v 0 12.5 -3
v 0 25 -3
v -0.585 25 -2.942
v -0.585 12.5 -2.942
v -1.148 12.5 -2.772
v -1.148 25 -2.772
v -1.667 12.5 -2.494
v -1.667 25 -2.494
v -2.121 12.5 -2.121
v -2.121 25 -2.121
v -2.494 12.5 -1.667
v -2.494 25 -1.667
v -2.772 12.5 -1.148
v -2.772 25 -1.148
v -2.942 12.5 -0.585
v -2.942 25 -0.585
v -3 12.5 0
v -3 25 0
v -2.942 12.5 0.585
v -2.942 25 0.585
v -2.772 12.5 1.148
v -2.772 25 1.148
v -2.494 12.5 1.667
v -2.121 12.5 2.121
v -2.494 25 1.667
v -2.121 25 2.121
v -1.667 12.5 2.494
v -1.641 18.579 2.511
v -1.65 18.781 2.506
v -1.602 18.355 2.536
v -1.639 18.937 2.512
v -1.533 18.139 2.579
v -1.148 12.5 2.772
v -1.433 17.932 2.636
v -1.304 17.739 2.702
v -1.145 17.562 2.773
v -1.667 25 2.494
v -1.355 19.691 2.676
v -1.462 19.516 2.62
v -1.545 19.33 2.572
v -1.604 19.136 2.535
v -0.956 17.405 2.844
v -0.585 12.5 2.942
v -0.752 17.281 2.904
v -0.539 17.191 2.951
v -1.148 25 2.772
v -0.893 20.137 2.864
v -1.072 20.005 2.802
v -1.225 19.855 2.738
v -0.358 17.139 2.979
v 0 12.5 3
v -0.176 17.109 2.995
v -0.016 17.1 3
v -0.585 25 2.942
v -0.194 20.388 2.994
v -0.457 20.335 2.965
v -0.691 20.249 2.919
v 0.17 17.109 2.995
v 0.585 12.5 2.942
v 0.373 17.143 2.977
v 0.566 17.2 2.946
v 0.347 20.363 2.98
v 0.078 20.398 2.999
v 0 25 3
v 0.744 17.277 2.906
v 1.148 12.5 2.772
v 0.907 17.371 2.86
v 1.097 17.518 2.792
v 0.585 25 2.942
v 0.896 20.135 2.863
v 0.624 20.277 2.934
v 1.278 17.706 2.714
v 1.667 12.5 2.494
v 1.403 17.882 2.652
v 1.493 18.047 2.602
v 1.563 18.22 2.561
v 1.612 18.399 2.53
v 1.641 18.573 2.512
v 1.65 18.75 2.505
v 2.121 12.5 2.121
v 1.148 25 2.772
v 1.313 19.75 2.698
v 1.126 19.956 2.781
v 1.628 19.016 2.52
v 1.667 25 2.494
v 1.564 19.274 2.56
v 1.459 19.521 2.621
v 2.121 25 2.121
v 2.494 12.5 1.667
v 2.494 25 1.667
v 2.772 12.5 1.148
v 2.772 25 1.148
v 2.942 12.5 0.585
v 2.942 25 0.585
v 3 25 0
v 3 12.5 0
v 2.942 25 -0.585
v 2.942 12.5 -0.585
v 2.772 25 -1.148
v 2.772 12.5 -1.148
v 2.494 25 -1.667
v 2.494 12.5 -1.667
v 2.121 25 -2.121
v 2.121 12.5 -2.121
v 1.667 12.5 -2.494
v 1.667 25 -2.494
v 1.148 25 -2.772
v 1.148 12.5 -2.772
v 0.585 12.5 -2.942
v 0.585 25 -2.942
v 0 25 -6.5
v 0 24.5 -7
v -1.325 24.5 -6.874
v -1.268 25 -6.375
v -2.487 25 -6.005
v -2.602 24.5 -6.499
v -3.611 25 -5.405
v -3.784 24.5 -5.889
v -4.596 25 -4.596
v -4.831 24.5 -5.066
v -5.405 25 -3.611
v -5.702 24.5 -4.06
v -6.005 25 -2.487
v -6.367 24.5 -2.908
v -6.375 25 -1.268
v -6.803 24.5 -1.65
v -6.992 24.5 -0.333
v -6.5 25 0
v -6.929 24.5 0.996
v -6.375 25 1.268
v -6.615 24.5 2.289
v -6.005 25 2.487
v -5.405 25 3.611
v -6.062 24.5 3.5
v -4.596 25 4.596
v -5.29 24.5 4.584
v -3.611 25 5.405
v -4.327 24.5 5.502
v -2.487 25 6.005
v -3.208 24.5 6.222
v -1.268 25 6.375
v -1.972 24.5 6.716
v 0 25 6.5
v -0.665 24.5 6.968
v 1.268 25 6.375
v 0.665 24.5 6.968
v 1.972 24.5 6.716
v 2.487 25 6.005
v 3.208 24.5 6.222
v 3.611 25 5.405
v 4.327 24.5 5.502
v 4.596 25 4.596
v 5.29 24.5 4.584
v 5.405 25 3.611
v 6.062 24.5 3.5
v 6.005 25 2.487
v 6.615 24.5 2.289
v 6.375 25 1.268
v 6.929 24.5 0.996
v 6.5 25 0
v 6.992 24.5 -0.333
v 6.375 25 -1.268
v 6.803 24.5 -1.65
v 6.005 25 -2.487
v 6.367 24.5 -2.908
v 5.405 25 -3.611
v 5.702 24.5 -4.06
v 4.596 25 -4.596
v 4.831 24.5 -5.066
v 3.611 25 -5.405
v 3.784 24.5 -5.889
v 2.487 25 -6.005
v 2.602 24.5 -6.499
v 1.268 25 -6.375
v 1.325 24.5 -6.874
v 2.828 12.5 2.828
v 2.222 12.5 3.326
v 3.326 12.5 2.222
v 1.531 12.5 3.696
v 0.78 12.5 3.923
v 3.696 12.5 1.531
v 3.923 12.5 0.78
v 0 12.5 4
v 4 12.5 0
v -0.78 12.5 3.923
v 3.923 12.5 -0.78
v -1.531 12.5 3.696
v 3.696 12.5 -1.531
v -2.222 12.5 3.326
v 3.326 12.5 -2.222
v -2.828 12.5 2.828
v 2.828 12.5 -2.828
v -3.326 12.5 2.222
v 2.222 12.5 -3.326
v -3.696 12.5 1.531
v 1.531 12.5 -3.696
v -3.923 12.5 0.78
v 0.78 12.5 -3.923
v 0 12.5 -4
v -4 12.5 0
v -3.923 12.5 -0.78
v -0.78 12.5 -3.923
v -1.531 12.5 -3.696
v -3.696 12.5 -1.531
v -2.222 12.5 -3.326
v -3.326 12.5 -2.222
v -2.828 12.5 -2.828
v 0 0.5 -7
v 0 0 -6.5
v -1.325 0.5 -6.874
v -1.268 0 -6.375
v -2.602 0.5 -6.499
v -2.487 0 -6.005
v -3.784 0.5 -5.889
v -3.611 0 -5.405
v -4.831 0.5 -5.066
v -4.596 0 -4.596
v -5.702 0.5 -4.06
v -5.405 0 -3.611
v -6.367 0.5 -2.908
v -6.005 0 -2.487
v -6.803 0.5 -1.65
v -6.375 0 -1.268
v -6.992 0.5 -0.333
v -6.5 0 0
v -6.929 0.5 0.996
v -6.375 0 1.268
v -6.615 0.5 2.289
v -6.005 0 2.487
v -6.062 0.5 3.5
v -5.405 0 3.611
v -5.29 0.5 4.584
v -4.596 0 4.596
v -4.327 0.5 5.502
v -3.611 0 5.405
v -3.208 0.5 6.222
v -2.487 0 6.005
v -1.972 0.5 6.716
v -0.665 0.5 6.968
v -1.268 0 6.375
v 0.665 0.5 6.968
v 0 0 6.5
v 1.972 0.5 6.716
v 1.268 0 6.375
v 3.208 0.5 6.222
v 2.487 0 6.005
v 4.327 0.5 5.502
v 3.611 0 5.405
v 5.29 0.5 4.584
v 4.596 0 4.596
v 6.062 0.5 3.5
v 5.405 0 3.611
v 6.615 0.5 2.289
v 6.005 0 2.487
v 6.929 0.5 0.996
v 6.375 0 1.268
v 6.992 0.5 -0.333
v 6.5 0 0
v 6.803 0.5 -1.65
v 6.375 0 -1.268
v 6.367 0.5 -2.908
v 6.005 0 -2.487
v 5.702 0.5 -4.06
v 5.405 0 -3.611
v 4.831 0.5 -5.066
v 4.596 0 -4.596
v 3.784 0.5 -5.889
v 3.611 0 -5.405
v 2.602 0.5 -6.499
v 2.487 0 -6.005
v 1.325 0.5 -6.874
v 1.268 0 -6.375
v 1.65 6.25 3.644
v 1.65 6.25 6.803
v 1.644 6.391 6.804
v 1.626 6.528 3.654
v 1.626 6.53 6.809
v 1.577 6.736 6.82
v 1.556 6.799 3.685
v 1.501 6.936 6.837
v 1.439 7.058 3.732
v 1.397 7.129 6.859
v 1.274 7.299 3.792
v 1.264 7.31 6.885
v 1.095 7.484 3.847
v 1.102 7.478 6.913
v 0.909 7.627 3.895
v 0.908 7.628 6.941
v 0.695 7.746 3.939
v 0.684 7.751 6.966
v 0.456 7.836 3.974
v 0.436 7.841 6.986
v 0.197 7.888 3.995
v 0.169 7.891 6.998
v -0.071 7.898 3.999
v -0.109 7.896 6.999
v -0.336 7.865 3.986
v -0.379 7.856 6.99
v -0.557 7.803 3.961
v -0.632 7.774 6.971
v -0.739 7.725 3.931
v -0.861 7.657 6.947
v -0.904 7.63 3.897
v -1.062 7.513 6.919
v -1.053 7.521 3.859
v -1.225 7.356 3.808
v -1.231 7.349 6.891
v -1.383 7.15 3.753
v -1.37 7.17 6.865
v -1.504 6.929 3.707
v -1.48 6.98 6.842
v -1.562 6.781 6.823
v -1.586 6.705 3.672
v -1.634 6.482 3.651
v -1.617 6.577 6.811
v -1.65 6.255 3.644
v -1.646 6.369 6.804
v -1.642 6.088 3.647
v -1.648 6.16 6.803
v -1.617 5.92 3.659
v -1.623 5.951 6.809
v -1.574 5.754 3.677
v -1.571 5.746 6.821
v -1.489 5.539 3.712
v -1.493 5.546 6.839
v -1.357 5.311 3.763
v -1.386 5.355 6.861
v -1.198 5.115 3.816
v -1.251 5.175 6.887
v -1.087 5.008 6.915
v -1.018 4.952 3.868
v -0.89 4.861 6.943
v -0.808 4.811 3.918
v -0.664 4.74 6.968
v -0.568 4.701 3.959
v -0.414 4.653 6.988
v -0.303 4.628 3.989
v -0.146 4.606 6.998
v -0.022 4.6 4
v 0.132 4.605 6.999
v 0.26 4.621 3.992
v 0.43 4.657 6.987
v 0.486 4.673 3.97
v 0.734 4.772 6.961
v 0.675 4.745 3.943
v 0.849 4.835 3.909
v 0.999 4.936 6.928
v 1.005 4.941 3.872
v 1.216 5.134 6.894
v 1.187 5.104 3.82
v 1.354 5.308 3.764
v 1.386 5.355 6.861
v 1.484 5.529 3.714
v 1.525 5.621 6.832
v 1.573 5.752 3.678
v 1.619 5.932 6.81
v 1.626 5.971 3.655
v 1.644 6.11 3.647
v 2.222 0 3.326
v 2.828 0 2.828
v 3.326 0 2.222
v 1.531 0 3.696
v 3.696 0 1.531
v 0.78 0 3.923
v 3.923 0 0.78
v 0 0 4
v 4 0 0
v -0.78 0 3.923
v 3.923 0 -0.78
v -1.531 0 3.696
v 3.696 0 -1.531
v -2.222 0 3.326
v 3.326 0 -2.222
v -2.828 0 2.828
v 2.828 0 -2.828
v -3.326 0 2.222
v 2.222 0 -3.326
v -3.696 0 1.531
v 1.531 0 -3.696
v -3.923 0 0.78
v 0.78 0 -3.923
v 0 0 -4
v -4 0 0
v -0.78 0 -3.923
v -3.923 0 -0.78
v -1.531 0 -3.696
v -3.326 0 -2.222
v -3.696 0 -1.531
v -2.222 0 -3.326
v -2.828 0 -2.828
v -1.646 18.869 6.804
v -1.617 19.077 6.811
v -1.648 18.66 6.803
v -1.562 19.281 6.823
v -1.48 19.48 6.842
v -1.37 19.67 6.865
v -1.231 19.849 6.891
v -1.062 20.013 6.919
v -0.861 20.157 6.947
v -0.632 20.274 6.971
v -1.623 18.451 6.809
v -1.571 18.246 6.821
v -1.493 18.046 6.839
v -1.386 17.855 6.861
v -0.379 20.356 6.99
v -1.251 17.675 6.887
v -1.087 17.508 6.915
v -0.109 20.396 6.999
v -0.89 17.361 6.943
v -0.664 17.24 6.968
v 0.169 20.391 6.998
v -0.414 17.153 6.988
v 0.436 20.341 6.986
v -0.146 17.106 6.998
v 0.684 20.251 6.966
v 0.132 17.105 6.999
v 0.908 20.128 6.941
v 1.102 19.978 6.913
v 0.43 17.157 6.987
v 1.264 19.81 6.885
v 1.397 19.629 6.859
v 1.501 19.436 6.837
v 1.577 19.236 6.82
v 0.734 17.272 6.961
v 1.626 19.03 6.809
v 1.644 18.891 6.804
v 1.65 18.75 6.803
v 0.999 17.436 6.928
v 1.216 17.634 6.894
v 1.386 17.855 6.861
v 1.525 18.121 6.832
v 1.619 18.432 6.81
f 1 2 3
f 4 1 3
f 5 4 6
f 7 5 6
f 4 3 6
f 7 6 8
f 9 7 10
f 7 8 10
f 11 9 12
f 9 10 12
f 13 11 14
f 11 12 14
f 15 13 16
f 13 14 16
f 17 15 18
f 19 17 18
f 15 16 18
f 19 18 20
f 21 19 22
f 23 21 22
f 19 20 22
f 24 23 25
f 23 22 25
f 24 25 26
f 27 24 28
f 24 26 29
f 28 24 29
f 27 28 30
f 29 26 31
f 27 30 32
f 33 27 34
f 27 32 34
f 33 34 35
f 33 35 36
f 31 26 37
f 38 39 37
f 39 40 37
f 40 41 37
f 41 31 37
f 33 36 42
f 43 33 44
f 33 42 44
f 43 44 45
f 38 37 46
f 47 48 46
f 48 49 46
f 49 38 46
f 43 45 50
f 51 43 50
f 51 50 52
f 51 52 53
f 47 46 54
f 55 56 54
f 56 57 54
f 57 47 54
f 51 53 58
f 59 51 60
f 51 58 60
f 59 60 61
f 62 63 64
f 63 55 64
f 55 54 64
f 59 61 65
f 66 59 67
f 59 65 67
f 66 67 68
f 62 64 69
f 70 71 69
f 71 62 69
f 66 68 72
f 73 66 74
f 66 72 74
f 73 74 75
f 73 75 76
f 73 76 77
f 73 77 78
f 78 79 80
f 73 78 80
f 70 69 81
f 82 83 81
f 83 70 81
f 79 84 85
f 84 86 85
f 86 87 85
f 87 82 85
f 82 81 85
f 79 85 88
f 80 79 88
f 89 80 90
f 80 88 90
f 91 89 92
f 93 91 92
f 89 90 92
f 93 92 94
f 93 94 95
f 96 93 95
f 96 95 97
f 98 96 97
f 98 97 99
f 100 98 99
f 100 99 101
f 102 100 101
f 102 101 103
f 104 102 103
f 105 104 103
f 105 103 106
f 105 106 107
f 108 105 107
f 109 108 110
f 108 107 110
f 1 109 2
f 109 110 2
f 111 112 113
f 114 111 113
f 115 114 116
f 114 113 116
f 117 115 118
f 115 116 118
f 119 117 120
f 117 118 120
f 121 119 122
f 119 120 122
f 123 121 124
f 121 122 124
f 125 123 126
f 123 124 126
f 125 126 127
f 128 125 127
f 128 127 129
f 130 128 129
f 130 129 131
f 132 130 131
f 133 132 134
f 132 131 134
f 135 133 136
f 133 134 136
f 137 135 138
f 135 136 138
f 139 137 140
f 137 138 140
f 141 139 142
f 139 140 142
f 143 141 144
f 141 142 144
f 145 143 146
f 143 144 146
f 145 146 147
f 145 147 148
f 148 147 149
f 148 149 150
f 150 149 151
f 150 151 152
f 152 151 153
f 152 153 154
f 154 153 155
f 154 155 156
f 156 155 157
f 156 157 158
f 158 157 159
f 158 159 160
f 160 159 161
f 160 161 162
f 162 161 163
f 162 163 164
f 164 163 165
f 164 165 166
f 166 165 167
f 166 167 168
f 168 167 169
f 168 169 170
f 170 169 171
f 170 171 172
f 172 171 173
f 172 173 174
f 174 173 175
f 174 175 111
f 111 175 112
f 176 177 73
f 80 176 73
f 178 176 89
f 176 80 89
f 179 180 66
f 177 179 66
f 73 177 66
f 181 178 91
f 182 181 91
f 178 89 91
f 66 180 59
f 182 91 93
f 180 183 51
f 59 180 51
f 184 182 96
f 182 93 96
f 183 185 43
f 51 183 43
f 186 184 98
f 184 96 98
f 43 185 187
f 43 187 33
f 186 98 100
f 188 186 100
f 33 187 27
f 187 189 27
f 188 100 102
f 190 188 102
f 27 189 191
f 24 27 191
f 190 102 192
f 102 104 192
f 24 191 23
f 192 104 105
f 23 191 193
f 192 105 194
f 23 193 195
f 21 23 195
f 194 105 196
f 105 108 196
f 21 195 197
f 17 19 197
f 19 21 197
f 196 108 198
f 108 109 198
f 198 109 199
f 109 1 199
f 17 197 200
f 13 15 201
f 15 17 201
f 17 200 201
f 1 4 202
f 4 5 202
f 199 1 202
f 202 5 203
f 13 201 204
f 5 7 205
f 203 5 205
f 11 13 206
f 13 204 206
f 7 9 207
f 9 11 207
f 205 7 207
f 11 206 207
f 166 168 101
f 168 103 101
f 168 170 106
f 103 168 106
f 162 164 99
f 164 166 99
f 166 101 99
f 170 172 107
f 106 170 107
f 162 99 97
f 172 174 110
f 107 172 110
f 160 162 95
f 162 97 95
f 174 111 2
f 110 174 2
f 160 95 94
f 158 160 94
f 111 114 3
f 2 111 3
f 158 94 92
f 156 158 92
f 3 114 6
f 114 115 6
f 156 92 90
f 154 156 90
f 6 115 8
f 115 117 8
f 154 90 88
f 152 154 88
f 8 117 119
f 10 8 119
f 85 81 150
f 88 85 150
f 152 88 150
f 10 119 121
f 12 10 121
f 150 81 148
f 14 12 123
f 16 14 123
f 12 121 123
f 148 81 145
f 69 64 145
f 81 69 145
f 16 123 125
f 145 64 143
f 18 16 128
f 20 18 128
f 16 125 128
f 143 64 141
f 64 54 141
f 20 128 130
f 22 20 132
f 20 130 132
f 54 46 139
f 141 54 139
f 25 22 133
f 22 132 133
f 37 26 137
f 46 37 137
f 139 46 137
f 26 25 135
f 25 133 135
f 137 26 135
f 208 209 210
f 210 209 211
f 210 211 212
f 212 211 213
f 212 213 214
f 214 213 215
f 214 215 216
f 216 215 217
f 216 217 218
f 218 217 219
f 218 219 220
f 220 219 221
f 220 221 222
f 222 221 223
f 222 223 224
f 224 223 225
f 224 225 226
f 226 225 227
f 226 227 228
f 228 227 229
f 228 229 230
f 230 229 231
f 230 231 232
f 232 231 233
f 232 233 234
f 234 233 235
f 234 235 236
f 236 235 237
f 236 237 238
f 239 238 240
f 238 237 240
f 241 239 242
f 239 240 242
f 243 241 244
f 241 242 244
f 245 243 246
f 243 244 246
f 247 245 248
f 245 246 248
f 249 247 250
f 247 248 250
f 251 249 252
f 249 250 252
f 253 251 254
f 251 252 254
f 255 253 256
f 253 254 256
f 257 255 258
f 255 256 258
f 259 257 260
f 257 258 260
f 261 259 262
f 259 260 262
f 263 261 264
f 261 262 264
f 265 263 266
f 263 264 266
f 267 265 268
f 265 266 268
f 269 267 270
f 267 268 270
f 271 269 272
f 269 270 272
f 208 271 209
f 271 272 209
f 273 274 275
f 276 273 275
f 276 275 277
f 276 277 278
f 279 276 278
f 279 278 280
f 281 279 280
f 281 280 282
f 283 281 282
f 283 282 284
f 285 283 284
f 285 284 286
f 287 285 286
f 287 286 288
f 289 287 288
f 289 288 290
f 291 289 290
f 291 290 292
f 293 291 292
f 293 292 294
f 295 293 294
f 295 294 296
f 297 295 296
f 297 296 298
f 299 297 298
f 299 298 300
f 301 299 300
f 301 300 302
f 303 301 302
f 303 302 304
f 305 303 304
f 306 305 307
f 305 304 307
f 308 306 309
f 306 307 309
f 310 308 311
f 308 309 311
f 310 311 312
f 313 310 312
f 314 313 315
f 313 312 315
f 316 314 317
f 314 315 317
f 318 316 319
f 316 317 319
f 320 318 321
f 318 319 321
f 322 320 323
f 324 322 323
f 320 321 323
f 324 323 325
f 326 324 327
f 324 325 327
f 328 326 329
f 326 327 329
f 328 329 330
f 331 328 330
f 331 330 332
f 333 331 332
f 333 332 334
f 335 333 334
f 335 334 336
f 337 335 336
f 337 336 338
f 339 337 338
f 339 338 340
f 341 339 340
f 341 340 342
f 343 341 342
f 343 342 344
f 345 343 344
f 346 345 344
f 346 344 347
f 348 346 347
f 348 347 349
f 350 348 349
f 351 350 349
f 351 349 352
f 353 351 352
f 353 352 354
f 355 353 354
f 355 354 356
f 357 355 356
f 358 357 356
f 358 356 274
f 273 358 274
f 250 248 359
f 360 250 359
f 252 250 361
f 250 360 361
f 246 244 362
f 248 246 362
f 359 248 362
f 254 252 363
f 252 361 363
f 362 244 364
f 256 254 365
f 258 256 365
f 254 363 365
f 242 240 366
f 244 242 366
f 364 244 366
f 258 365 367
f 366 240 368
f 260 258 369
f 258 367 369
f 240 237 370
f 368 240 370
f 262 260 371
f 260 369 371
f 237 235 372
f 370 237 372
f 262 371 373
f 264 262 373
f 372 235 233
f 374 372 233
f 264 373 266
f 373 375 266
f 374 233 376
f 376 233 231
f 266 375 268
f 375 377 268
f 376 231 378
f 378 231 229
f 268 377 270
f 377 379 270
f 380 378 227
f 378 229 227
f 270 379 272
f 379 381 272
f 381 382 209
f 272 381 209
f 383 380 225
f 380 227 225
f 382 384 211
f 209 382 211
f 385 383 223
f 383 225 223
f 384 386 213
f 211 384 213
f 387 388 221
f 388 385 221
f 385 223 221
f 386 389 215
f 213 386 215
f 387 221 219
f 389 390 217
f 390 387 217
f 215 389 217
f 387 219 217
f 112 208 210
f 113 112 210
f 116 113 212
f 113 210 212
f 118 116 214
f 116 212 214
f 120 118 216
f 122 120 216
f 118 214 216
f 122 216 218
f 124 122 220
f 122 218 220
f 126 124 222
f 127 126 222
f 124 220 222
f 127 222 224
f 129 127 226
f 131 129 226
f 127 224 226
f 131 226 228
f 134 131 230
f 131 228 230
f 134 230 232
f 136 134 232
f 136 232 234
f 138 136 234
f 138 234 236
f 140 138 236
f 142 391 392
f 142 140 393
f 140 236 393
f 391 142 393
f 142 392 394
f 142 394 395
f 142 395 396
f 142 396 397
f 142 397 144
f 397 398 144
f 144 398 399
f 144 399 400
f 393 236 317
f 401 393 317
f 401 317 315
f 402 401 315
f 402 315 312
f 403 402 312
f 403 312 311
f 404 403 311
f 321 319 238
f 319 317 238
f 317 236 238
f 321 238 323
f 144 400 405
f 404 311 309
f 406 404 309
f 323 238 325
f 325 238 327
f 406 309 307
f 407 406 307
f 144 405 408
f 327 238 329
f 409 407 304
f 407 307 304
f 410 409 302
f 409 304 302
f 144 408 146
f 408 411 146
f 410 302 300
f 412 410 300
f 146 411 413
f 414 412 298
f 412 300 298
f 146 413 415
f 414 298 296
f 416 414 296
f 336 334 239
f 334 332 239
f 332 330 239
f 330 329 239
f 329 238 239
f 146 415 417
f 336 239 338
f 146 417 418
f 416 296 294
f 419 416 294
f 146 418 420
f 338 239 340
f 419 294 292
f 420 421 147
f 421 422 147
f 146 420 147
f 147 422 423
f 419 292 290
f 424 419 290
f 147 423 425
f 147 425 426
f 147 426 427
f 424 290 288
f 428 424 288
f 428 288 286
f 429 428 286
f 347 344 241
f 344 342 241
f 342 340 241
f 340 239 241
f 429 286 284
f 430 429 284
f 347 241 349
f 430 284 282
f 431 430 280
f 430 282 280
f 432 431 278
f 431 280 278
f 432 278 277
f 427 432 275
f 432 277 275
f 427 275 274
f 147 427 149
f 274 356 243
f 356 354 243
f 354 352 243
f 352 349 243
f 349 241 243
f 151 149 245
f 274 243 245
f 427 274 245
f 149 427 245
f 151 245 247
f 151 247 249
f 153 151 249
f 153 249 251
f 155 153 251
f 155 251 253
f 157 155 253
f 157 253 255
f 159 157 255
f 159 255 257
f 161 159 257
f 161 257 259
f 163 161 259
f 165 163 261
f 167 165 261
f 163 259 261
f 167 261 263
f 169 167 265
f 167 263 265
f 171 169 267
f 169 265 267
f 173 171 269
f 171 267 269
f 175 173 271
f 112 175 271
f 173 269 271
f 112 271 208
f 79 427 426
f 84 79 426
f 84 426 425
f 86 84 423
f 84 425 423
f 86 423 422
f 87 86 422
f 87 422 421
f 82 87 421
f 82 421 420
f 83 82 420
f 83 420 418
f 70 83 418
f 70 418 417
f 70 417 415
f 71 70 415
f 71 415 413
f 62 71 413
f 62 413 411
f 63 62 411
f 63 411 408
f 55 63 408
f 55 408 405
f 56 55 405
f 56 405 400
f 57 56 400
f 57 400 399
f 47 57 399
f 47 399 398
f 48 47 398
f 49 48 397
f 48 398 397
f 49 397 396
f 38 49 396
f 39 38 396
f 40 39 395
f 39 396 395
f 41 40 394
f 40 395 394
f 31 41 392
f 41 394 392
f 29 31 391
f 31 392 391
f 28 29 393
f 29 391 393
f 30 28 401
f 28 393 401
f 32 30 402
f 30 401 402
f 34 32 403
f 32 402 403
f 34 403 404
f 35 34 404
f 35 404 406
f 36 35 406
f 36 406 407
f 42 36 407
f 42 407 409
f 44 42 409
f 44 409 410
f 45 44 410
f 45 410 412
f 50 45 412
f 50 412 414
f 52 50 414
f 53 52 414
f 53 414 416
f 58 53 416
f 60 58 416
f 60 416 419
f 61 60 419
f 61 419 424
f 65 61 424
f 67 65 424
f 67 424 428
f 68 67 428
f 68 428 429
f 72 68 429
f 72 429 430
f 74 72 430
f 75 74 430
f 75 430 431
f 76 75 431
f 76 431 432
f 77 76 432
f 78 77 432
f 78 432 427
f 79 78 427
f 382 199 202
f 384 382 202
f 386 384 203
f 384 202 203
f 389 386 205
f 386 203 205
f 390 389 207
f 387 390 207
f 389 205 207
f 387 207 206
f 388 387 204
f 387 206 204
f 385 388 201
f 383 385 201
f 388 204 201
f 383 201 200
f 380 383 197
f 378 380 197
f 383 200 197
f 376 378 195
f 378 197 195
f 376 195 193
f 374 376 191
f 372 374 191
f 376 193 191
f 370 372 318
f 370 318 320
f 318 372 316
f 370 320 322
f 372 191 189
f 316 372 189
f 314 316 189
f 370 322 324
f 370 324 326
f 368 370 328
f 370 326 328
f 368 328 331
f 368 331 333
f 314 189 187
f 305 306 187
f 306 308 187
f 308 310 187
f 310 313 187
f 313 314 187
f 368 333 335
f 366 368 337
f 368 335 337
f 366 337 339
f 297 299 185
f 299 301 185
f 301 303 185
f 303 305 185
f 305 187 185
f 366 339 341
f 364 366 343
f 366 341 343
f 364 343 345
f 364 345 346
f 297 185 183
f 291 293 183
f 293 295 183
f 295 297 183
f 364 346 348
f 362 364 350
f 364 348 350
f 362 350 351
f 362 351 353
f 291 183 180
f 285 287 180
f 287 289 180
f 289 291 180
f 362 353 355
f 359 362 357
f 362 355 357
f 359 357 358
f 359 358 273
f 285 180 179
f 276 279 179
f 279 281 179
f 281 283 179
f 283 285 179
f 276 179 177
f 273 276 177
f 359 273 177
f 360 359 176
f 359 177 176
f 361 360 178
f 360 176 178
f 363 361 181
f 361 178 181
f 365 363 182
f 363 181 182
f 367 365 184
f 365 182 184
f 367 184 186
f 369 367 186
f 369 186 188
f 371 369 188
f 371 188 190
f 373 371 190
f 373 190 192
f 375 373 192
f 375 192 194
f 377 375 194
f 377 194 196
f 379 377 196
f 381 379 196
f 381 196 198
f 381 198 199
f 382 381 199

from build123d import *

# Parameters (mm, degrees)
CHAMFER1_SIZE          = 0.5
M4_TAPPED_HOLE1_REACH  = 31.496
M4_TAPPED_HOLE1_BORE_R = 1.65


with BuildPart() as part:
    # Sketch2 → Revolve1 (revolve)
    with BuildSketch(Plane(origin=(0, 0, 0), x_dir=(0, 0, -1), z_dir=(1, 0, 0))):
        Polygon((4, 0), (4, 12.5), (3, 12.5), (3, 25), (7, 25), (7, 0), align=None)
    revolve(axis=Axis((0, 0, 0), (0, 1, 0)))

    # Chamfer1
    chamfer1_edges = [part.edges().sort_by_distance(p)[0] for p in [
        (0, 0, 7),
        (0, 25, 7),
    ]]
    chamfer(chamfer1_edges, length=CHAMFER1_SIZE)

    # M4 Tapped Hole1 bore → M4 Tapped Hole1 (cut, up to next)
    with BuildSketch(Plane.XY.offset(7), mode=Mode.PRIVATE) as m4_tapped_hole1_sk1:
        with Locations((0, 18.75)):
            Circle(M4_TAPPED_HOLE1_BORE_R)
    m4_tapped_hole1_tool1 = extrude(m4_tapped_hole1_sk1.sketch, amount=-M4_TAPPED_HOLE1_REACH, mode=Mode.PRIVATE) & part.part
    # M4 Tapped Hole1 bore → M4 Tapped Hole1 (cut, up to next)
    with BuildSketch(Plane.XY.offset(7), mode=Mode.PRIVATE) as m4_tapped_hole1_sk2:
        with Locations((0, 6.25)):
            Circle(M4_TAPPED_HOLE1_BORE_R)
    m4_tapped_hole1_tool2 = extrude(m4_tapped_hole1_sk2.sketch, amount=-M4_TAPPED_HOLE1_REACH, mode=Mode.PRIVATE) & part.part
    add(m4_tapped_hole1_tool1.solids().sort_by_distance((0, 18.75, 7))[0], mode=Mode.SUBTRACT)
    add(m4_tapped_hole1_tool2.solids().sort_by_distance((0, 6.25, 7))[0], mode=Mode.SUBTRACT)


solid = part.part
